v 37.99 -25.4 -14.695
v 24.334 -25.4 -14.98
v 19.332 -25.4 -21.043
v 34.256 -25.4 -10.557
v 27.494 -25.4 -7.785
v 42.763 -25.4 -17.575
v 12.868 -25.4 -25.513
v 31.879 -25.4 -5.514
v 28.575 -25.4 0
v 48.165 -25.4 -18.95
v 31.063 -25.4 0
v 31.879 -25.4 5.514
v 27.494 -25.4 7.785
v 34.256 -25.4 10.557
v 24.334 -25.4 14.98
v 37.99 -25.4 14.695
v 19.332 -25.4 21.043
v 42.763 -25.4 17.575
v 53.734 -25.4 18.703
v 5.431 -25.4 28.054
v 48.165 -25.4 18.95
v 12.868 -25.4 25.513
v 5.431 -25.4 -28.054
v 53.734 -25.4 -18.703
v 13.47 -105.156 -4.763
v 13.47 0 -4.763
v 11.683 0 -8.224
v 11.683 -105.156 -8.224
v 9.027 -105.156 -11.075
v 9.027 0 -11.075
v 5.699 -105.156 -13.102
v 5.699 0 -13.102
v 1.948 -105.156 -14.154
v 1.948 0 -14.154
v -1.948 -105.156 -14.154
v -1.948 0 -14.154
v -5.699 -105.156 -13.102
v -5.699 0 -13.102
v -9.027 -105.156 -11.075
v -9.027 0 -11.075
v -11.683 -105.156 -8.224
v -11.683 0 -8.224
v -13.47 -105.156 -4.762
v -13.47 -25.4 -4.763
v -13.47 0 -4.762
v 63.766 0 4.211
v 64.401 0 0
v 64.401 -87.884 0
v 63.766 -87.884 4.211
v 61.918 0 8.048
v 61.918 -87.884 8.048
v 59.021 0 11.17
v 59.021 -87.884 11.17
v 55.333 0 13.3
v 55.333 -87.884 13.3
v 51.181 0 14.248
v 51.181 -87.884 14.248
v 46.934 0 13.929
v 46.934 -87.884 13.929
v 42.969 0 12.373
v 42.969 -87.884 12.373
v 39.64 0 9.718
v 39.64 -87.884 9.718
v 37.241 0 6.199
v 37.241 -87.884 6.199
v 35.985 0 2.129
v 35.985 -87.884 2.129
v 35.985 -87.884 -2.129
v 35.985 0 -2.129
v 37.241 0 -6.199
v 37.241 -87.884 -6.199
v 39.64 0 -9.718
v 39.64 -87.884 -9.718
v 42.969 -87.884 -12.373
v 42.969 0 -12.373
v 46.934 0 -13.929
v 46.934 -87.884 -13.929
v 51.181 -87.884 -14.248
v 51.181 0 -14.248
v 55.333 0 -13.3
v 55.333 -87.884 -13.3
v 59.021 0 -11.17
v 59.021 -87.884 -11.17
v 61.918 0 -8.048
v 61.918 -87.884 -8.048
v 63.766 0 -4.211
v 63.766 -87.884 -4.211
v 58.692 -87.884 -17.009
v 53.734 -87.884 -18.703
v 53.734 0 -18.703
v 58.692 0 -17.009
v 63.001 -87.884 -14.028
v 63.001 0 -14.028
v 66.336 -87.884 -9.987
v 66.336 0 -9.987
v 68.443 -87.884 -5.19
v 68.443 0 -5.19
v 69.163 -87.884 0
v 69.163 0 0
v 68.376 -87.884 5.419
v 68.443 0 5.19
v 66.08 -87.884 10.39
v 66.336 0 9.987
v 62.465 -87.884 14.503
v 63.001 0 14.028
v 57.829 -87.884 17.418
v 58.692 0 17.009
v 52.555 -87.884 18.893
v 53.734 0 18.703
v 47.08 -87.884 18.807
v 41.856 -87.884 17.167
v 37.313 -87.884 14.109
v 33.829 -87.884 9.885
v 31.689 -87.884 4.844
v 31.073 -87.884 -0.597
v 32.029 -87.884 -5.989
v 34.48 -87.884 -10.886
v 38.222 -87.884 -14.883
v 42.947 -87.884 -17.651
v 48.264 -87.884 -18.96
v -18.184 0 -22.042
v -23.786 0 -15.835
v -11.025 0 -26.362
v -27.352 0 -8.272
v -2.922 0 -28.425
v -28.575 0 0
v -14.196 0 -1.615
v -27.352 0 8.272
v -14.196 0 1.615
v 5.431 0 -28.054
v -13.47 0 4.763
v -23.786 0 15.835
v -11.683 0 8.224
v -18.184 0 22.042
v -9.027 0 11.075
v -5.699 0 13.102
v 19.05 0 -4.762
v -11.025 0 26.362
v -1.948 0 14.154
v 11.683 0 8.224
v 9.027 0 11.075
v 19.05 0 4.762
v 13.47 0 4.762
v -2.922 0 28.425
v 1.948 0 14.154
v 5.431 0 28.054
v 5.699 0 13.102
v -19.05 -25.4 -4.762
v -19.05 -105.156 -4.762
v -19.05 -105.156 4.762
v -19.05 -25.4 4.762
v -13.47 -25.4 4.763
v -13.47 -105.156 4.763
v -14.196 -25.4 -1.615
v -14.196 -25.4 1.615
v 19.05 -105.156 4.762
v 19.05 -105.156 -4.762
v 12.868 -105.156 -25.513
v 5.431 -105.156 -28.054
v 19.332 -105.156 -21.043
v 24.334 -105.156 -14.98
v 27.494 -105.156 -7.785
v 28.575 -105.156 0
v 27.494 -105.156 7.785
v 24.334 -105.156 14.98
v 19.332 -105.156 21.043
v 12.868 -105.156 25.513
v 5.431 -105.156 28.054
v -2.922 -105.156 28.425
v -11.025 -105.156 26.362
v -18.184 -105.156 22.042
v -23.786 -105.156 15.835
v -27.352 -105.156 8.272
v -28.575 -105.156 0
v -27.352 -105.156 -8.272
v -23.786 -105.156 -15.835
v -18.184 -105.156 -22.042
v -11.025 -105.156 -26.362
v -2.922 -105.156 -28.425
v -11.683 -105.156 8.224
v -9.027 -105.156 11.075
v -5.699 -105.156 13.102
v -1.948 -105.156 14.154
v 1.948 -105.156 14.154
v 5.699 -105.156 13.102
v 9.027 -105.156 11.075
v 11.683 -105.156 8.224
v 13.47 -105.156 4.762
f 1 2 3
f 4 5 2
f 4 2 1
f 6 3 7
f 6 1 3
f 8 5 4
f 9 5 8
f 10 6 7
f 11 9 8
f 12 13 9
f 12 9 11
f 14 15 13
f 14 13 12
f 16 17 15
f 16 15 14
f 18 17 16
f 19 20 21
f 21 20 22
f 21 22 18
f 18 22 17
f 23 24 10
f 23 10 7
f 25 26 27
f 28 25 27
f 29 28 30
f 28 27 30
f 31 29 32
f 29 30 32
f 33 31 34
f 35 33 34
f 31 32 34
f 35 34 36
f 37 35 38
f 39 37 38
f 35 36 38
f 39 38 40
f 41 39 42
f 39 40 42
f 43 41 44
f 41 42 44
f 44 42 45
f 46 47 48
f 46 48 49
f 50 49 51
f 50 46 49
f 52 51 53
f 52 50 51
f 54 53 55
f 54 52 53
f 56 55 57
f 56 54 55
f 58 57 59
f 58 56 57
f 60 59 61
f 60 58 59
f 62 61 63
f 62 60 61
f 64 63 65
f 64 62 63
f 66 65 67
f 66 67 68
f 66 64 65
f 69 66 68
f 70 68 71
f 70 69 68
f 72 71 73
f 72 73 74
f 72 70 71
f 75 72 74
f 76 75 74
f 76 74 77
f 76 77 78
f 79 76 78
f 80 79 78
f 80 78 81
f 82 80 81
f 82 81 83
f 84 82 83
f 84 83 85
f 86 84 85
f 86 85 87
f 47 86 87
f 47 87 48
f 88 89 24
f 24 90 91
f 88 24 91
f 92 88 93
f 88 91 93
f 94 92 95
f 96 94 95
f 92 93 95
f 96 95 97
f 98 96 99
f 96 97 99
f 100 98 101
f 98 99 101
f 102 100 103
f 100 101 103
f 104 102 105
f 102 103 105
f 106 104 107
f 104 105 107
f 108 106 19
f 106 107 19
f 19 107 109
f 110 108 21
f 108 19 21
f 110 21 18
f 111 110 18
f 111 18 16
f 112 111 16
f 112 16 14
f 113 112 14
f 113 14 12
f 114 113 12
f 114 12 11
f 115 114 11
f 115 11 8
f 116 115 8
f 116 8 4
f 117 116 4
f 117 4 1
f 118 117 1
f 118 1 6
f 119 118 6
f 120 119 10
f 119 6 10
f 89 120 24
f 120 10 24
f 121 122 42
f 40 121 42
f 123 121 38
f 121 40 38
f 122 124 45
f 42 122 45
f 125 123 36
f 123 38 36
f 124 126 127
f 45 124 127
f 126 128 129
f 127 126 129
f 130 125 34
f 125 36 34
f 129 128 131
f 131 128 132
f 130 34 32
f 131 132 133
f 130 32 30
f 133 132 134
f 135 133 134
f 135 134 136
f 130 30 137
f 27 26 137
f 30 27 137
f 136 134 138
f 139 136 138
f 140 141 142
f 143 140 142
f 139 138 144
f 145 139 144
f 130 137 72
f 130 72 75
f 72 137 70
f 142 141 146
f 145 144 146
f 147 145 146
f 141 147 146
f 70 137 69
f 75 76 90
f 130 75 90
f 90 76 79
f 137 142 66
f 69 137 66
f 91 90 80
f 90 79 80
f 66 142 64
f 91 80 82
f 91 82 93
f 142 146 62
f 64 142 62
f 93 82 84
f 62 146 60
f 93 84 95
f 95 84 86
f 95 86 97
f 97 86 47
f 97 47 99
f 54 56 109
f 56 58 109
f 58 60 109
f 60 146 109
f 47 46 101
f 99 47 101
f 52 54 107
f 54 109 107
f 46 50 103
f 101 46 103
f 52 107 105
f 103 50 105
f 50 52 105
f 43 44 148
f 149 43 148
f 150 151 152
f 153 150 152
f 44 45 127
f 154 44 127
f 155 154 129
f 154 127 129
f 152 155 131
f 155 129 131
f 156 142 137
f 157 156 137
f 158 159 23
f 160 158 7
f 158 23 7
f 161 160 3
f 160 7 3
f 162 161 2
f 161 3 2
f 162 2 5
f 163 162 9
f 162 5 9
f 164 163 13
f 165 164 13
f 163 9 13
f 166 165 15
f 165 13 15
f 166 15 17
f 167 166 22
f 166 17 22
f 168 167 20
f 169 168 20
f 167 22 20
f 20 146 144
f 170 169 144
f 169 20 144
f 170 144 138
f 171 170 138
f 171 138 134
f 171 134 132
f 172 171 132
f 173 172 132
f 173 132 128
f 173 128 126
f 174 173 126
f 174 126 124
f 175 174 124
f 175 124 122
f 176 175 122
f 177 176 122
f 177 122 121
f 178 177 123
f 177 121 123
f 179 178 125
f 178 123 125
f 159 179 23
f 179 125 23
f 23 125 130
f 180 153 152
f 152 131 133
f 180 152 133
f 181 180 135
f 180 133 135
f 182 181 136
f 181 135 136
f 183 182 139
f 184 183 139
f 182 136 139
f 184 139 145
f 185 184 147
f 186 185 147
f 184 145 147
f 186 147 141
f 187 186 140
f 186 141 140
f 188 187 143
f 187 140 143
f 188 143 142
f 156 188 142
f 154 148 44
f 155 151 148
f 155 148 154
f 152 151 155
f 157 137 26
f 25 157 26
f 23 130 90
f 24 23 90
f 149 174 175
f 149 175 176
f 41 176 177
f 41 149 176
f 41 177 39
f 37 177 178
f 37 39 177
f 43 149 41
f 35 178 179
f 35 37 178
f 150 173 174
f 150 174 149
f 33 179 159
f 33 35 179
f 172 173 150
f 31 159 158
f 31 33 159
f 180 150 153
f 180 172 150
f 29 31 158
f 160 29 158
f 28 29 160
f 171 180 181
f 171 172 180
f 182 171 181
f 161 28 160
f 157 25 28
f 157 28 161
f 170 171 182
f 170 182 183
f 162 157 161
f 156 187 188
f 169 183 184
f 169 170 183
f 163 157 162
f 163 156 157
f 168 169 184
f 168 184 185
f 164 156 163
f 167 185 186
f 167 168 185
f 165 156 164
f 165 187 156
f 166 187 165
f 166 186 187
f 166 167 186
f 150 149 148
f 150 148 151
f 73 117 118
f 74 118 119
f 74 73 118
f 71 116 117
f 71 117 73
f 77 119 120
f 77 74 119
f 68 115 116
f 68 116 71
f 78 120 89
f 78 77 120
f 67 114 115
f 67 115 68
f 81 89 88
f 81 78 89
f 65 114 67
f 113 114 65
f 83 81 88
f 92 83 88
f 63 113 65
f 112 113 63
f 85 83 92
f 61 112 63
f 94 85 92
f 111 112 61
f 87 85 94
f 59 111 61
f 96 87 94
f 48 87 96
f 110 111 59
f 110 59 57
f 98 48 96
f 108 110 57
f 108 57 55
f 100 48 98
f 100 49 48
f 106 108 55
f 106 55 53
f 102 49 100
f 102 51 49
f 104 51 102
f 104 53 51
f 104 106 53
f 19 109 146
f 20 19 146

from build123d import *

# Parameters (mm, degrees)
F0_R     = 14.2875
F1_DEPTH = 25.4
F2_DEPTH = 105.156
F3_DEPTH = 87.884


with BuildPart() as f1:
    # F0 (on Front) → F1 (new body)
    with BuildSketch(Plane.XZ):
        with BuildLine():
            ThreePointArc((5.4312411777, -28.0540949644), (22.0423268015, -18.1842364199), (28.575, 0))
            ThreePointArc((28.575, 0), (22.0423268015, 18.1842364199), (5.4312411777, 28.0540949644))
            ThreePointArc((5.4312411777, 28.0540949644), (-28.575, 0), (5.4312411777, -28.0540949644))
        make_face()
        with BuildLine():
            ThreePointArc((-13.4703841816, 4.7625), (0, 14.2875), (13.4703841816, 4.7625))
            Line((13.4703841816, 4.7625), (19.05, 4.7625))
            Line((19.05, 4.7625), (19.05, -4.7625))
            Line((19.05, -4.7625), (13.4703841816, -4.7625))
            ThreePointArc((13.4703841816, -4.7625), (0, -14.2875), (-13.4703841816, -4.7625))
            Line((-13.4703841816, -4.7625), (-19.05, -4.7625))
            Line((-19.05, -4.7625), (-19.05, 4.7625))
            Line((-19.05, 4.7625), (-13.4703841816, 4.7625))
        make_face(mode=Mode.SUBTRACT)
        with BuildLine():
            ThreePointArc((69.1631999291, 0), (64.8080844634, 12.1228242799), (53.7340273808, 18.7027299762))
            ThreePointArc((53.7340273808, 18.7027299762), (31.0631999291, 0), (53.7340273808, -18.7027299762))
            ThreePointArc((53.7340273808, -18.7027299762), (64.8080844634, -12.1228242799), (69.1631999291, 0))
        make_face()
        with Locations((50.1131999291, 0)):
            Circle(F0_R, mode=Mode.SUBTRACT)
        with BuildLine():
            ThreePointArc((5.4312411777, 28.0540949644), (22.0423268015, 18.1842364199), (28.575, 0))
            ThreePointArc((28.575, 0), (22.0423268015, -18.1842364199), (5.4312411777, -28.0540949644))
            Line((5.4312411777, -28.0540949644), (53.7340273808, -18.7027299762))
            ThreePointArc((53.7340273808, -18.7027299762), (31.0631999291, 0), (53.7340273808, 18.7027299762))
            Line((53.7340273808, 18.7027299762), (5.4312411777, 28.0540949644))
        make_face()
        with BuildLine():
            ThreePointArc((-13.4703841816, -4.7625), (-14.2875, 0), (-13.4703841816, 4.7625))
            Line((-13.4703841816, 4.7625), (-19.05, 4.7625))
            Line((-19.05, 4.7625), (-19.05, -4.7625))
            Line((-19.05, -4.7625), (-13.4703841816, -4.7625))
        make_face()
    extrude(amount=F1_DEPTH)

    # F0 (on Front) → F2 (join)
    with BuildSketch(Plane.XZ):
        with BuildLine():
            ThreePointArc((5.4312411777, -28.0540949644), (22.0423268015, -18.1842364199), (28.575, 0))
            ThreePointArc((28.575, 0), (22.0423268015, 18.1842364199), (5.4312411777, 28.0540949644))
            ThreePointArc((5.4312411777, 28.0540949644), (-28.575, 0), (5.4312411777, -28.0540949644))
        make_face()
        with BuildLine():
            ThreePointArc((-13.4703841816, 4.7625), (0, 14.2875), (13.4703841816, 4.7625))
            Line((13.4703841816, 4.7625), (19.05, 4.7625))
            Line((19.05, 4.7625), (19.05, -4.7625))
            Line((19.05, -4.7625), (13.4703841816, -4.7625))
            ThreePointArc((13.4703841816, -4.7625), (0, -14.2875), (-13.4703841816, -4.7625))
            Line((-13.4703841816, -4.7625), (-19.05, -4.7625))
            Line((-19.05, -4.7625), (-19.05, 4.7625))
            Line((-19.05, 4.7625), (-13.4703841816, 4.7625))
        make_face(mode=Mode.SUBTRACT)
    extrude(amount=F2_DEPTH)

    # F0 (on Front) → F3 (join)
    with BuildSketch(Plane.XZ):
        with BuildLine():
            ThreePointArc((69.1631999291, 0), (64.8080844634, 12.1228242799), (53.7340273808, 18.7027299762))
            ThreePointArc((53.7340273808, 18.7027299762), (31.0631999291, 0), (53.7340273808, -18.7027299762))
            ThreePointArc((53.7340273808, -18.7027299762), (64.8080844634, -12.1228242799), (69.1631999291, 0))
        make_face()
        with Locations((50.1131999291, 0)):
            Circle(F0_R, mode=Mode.SUBTRACT)
    extrude(amount=F3_DEPTH)


solid = f1.part
